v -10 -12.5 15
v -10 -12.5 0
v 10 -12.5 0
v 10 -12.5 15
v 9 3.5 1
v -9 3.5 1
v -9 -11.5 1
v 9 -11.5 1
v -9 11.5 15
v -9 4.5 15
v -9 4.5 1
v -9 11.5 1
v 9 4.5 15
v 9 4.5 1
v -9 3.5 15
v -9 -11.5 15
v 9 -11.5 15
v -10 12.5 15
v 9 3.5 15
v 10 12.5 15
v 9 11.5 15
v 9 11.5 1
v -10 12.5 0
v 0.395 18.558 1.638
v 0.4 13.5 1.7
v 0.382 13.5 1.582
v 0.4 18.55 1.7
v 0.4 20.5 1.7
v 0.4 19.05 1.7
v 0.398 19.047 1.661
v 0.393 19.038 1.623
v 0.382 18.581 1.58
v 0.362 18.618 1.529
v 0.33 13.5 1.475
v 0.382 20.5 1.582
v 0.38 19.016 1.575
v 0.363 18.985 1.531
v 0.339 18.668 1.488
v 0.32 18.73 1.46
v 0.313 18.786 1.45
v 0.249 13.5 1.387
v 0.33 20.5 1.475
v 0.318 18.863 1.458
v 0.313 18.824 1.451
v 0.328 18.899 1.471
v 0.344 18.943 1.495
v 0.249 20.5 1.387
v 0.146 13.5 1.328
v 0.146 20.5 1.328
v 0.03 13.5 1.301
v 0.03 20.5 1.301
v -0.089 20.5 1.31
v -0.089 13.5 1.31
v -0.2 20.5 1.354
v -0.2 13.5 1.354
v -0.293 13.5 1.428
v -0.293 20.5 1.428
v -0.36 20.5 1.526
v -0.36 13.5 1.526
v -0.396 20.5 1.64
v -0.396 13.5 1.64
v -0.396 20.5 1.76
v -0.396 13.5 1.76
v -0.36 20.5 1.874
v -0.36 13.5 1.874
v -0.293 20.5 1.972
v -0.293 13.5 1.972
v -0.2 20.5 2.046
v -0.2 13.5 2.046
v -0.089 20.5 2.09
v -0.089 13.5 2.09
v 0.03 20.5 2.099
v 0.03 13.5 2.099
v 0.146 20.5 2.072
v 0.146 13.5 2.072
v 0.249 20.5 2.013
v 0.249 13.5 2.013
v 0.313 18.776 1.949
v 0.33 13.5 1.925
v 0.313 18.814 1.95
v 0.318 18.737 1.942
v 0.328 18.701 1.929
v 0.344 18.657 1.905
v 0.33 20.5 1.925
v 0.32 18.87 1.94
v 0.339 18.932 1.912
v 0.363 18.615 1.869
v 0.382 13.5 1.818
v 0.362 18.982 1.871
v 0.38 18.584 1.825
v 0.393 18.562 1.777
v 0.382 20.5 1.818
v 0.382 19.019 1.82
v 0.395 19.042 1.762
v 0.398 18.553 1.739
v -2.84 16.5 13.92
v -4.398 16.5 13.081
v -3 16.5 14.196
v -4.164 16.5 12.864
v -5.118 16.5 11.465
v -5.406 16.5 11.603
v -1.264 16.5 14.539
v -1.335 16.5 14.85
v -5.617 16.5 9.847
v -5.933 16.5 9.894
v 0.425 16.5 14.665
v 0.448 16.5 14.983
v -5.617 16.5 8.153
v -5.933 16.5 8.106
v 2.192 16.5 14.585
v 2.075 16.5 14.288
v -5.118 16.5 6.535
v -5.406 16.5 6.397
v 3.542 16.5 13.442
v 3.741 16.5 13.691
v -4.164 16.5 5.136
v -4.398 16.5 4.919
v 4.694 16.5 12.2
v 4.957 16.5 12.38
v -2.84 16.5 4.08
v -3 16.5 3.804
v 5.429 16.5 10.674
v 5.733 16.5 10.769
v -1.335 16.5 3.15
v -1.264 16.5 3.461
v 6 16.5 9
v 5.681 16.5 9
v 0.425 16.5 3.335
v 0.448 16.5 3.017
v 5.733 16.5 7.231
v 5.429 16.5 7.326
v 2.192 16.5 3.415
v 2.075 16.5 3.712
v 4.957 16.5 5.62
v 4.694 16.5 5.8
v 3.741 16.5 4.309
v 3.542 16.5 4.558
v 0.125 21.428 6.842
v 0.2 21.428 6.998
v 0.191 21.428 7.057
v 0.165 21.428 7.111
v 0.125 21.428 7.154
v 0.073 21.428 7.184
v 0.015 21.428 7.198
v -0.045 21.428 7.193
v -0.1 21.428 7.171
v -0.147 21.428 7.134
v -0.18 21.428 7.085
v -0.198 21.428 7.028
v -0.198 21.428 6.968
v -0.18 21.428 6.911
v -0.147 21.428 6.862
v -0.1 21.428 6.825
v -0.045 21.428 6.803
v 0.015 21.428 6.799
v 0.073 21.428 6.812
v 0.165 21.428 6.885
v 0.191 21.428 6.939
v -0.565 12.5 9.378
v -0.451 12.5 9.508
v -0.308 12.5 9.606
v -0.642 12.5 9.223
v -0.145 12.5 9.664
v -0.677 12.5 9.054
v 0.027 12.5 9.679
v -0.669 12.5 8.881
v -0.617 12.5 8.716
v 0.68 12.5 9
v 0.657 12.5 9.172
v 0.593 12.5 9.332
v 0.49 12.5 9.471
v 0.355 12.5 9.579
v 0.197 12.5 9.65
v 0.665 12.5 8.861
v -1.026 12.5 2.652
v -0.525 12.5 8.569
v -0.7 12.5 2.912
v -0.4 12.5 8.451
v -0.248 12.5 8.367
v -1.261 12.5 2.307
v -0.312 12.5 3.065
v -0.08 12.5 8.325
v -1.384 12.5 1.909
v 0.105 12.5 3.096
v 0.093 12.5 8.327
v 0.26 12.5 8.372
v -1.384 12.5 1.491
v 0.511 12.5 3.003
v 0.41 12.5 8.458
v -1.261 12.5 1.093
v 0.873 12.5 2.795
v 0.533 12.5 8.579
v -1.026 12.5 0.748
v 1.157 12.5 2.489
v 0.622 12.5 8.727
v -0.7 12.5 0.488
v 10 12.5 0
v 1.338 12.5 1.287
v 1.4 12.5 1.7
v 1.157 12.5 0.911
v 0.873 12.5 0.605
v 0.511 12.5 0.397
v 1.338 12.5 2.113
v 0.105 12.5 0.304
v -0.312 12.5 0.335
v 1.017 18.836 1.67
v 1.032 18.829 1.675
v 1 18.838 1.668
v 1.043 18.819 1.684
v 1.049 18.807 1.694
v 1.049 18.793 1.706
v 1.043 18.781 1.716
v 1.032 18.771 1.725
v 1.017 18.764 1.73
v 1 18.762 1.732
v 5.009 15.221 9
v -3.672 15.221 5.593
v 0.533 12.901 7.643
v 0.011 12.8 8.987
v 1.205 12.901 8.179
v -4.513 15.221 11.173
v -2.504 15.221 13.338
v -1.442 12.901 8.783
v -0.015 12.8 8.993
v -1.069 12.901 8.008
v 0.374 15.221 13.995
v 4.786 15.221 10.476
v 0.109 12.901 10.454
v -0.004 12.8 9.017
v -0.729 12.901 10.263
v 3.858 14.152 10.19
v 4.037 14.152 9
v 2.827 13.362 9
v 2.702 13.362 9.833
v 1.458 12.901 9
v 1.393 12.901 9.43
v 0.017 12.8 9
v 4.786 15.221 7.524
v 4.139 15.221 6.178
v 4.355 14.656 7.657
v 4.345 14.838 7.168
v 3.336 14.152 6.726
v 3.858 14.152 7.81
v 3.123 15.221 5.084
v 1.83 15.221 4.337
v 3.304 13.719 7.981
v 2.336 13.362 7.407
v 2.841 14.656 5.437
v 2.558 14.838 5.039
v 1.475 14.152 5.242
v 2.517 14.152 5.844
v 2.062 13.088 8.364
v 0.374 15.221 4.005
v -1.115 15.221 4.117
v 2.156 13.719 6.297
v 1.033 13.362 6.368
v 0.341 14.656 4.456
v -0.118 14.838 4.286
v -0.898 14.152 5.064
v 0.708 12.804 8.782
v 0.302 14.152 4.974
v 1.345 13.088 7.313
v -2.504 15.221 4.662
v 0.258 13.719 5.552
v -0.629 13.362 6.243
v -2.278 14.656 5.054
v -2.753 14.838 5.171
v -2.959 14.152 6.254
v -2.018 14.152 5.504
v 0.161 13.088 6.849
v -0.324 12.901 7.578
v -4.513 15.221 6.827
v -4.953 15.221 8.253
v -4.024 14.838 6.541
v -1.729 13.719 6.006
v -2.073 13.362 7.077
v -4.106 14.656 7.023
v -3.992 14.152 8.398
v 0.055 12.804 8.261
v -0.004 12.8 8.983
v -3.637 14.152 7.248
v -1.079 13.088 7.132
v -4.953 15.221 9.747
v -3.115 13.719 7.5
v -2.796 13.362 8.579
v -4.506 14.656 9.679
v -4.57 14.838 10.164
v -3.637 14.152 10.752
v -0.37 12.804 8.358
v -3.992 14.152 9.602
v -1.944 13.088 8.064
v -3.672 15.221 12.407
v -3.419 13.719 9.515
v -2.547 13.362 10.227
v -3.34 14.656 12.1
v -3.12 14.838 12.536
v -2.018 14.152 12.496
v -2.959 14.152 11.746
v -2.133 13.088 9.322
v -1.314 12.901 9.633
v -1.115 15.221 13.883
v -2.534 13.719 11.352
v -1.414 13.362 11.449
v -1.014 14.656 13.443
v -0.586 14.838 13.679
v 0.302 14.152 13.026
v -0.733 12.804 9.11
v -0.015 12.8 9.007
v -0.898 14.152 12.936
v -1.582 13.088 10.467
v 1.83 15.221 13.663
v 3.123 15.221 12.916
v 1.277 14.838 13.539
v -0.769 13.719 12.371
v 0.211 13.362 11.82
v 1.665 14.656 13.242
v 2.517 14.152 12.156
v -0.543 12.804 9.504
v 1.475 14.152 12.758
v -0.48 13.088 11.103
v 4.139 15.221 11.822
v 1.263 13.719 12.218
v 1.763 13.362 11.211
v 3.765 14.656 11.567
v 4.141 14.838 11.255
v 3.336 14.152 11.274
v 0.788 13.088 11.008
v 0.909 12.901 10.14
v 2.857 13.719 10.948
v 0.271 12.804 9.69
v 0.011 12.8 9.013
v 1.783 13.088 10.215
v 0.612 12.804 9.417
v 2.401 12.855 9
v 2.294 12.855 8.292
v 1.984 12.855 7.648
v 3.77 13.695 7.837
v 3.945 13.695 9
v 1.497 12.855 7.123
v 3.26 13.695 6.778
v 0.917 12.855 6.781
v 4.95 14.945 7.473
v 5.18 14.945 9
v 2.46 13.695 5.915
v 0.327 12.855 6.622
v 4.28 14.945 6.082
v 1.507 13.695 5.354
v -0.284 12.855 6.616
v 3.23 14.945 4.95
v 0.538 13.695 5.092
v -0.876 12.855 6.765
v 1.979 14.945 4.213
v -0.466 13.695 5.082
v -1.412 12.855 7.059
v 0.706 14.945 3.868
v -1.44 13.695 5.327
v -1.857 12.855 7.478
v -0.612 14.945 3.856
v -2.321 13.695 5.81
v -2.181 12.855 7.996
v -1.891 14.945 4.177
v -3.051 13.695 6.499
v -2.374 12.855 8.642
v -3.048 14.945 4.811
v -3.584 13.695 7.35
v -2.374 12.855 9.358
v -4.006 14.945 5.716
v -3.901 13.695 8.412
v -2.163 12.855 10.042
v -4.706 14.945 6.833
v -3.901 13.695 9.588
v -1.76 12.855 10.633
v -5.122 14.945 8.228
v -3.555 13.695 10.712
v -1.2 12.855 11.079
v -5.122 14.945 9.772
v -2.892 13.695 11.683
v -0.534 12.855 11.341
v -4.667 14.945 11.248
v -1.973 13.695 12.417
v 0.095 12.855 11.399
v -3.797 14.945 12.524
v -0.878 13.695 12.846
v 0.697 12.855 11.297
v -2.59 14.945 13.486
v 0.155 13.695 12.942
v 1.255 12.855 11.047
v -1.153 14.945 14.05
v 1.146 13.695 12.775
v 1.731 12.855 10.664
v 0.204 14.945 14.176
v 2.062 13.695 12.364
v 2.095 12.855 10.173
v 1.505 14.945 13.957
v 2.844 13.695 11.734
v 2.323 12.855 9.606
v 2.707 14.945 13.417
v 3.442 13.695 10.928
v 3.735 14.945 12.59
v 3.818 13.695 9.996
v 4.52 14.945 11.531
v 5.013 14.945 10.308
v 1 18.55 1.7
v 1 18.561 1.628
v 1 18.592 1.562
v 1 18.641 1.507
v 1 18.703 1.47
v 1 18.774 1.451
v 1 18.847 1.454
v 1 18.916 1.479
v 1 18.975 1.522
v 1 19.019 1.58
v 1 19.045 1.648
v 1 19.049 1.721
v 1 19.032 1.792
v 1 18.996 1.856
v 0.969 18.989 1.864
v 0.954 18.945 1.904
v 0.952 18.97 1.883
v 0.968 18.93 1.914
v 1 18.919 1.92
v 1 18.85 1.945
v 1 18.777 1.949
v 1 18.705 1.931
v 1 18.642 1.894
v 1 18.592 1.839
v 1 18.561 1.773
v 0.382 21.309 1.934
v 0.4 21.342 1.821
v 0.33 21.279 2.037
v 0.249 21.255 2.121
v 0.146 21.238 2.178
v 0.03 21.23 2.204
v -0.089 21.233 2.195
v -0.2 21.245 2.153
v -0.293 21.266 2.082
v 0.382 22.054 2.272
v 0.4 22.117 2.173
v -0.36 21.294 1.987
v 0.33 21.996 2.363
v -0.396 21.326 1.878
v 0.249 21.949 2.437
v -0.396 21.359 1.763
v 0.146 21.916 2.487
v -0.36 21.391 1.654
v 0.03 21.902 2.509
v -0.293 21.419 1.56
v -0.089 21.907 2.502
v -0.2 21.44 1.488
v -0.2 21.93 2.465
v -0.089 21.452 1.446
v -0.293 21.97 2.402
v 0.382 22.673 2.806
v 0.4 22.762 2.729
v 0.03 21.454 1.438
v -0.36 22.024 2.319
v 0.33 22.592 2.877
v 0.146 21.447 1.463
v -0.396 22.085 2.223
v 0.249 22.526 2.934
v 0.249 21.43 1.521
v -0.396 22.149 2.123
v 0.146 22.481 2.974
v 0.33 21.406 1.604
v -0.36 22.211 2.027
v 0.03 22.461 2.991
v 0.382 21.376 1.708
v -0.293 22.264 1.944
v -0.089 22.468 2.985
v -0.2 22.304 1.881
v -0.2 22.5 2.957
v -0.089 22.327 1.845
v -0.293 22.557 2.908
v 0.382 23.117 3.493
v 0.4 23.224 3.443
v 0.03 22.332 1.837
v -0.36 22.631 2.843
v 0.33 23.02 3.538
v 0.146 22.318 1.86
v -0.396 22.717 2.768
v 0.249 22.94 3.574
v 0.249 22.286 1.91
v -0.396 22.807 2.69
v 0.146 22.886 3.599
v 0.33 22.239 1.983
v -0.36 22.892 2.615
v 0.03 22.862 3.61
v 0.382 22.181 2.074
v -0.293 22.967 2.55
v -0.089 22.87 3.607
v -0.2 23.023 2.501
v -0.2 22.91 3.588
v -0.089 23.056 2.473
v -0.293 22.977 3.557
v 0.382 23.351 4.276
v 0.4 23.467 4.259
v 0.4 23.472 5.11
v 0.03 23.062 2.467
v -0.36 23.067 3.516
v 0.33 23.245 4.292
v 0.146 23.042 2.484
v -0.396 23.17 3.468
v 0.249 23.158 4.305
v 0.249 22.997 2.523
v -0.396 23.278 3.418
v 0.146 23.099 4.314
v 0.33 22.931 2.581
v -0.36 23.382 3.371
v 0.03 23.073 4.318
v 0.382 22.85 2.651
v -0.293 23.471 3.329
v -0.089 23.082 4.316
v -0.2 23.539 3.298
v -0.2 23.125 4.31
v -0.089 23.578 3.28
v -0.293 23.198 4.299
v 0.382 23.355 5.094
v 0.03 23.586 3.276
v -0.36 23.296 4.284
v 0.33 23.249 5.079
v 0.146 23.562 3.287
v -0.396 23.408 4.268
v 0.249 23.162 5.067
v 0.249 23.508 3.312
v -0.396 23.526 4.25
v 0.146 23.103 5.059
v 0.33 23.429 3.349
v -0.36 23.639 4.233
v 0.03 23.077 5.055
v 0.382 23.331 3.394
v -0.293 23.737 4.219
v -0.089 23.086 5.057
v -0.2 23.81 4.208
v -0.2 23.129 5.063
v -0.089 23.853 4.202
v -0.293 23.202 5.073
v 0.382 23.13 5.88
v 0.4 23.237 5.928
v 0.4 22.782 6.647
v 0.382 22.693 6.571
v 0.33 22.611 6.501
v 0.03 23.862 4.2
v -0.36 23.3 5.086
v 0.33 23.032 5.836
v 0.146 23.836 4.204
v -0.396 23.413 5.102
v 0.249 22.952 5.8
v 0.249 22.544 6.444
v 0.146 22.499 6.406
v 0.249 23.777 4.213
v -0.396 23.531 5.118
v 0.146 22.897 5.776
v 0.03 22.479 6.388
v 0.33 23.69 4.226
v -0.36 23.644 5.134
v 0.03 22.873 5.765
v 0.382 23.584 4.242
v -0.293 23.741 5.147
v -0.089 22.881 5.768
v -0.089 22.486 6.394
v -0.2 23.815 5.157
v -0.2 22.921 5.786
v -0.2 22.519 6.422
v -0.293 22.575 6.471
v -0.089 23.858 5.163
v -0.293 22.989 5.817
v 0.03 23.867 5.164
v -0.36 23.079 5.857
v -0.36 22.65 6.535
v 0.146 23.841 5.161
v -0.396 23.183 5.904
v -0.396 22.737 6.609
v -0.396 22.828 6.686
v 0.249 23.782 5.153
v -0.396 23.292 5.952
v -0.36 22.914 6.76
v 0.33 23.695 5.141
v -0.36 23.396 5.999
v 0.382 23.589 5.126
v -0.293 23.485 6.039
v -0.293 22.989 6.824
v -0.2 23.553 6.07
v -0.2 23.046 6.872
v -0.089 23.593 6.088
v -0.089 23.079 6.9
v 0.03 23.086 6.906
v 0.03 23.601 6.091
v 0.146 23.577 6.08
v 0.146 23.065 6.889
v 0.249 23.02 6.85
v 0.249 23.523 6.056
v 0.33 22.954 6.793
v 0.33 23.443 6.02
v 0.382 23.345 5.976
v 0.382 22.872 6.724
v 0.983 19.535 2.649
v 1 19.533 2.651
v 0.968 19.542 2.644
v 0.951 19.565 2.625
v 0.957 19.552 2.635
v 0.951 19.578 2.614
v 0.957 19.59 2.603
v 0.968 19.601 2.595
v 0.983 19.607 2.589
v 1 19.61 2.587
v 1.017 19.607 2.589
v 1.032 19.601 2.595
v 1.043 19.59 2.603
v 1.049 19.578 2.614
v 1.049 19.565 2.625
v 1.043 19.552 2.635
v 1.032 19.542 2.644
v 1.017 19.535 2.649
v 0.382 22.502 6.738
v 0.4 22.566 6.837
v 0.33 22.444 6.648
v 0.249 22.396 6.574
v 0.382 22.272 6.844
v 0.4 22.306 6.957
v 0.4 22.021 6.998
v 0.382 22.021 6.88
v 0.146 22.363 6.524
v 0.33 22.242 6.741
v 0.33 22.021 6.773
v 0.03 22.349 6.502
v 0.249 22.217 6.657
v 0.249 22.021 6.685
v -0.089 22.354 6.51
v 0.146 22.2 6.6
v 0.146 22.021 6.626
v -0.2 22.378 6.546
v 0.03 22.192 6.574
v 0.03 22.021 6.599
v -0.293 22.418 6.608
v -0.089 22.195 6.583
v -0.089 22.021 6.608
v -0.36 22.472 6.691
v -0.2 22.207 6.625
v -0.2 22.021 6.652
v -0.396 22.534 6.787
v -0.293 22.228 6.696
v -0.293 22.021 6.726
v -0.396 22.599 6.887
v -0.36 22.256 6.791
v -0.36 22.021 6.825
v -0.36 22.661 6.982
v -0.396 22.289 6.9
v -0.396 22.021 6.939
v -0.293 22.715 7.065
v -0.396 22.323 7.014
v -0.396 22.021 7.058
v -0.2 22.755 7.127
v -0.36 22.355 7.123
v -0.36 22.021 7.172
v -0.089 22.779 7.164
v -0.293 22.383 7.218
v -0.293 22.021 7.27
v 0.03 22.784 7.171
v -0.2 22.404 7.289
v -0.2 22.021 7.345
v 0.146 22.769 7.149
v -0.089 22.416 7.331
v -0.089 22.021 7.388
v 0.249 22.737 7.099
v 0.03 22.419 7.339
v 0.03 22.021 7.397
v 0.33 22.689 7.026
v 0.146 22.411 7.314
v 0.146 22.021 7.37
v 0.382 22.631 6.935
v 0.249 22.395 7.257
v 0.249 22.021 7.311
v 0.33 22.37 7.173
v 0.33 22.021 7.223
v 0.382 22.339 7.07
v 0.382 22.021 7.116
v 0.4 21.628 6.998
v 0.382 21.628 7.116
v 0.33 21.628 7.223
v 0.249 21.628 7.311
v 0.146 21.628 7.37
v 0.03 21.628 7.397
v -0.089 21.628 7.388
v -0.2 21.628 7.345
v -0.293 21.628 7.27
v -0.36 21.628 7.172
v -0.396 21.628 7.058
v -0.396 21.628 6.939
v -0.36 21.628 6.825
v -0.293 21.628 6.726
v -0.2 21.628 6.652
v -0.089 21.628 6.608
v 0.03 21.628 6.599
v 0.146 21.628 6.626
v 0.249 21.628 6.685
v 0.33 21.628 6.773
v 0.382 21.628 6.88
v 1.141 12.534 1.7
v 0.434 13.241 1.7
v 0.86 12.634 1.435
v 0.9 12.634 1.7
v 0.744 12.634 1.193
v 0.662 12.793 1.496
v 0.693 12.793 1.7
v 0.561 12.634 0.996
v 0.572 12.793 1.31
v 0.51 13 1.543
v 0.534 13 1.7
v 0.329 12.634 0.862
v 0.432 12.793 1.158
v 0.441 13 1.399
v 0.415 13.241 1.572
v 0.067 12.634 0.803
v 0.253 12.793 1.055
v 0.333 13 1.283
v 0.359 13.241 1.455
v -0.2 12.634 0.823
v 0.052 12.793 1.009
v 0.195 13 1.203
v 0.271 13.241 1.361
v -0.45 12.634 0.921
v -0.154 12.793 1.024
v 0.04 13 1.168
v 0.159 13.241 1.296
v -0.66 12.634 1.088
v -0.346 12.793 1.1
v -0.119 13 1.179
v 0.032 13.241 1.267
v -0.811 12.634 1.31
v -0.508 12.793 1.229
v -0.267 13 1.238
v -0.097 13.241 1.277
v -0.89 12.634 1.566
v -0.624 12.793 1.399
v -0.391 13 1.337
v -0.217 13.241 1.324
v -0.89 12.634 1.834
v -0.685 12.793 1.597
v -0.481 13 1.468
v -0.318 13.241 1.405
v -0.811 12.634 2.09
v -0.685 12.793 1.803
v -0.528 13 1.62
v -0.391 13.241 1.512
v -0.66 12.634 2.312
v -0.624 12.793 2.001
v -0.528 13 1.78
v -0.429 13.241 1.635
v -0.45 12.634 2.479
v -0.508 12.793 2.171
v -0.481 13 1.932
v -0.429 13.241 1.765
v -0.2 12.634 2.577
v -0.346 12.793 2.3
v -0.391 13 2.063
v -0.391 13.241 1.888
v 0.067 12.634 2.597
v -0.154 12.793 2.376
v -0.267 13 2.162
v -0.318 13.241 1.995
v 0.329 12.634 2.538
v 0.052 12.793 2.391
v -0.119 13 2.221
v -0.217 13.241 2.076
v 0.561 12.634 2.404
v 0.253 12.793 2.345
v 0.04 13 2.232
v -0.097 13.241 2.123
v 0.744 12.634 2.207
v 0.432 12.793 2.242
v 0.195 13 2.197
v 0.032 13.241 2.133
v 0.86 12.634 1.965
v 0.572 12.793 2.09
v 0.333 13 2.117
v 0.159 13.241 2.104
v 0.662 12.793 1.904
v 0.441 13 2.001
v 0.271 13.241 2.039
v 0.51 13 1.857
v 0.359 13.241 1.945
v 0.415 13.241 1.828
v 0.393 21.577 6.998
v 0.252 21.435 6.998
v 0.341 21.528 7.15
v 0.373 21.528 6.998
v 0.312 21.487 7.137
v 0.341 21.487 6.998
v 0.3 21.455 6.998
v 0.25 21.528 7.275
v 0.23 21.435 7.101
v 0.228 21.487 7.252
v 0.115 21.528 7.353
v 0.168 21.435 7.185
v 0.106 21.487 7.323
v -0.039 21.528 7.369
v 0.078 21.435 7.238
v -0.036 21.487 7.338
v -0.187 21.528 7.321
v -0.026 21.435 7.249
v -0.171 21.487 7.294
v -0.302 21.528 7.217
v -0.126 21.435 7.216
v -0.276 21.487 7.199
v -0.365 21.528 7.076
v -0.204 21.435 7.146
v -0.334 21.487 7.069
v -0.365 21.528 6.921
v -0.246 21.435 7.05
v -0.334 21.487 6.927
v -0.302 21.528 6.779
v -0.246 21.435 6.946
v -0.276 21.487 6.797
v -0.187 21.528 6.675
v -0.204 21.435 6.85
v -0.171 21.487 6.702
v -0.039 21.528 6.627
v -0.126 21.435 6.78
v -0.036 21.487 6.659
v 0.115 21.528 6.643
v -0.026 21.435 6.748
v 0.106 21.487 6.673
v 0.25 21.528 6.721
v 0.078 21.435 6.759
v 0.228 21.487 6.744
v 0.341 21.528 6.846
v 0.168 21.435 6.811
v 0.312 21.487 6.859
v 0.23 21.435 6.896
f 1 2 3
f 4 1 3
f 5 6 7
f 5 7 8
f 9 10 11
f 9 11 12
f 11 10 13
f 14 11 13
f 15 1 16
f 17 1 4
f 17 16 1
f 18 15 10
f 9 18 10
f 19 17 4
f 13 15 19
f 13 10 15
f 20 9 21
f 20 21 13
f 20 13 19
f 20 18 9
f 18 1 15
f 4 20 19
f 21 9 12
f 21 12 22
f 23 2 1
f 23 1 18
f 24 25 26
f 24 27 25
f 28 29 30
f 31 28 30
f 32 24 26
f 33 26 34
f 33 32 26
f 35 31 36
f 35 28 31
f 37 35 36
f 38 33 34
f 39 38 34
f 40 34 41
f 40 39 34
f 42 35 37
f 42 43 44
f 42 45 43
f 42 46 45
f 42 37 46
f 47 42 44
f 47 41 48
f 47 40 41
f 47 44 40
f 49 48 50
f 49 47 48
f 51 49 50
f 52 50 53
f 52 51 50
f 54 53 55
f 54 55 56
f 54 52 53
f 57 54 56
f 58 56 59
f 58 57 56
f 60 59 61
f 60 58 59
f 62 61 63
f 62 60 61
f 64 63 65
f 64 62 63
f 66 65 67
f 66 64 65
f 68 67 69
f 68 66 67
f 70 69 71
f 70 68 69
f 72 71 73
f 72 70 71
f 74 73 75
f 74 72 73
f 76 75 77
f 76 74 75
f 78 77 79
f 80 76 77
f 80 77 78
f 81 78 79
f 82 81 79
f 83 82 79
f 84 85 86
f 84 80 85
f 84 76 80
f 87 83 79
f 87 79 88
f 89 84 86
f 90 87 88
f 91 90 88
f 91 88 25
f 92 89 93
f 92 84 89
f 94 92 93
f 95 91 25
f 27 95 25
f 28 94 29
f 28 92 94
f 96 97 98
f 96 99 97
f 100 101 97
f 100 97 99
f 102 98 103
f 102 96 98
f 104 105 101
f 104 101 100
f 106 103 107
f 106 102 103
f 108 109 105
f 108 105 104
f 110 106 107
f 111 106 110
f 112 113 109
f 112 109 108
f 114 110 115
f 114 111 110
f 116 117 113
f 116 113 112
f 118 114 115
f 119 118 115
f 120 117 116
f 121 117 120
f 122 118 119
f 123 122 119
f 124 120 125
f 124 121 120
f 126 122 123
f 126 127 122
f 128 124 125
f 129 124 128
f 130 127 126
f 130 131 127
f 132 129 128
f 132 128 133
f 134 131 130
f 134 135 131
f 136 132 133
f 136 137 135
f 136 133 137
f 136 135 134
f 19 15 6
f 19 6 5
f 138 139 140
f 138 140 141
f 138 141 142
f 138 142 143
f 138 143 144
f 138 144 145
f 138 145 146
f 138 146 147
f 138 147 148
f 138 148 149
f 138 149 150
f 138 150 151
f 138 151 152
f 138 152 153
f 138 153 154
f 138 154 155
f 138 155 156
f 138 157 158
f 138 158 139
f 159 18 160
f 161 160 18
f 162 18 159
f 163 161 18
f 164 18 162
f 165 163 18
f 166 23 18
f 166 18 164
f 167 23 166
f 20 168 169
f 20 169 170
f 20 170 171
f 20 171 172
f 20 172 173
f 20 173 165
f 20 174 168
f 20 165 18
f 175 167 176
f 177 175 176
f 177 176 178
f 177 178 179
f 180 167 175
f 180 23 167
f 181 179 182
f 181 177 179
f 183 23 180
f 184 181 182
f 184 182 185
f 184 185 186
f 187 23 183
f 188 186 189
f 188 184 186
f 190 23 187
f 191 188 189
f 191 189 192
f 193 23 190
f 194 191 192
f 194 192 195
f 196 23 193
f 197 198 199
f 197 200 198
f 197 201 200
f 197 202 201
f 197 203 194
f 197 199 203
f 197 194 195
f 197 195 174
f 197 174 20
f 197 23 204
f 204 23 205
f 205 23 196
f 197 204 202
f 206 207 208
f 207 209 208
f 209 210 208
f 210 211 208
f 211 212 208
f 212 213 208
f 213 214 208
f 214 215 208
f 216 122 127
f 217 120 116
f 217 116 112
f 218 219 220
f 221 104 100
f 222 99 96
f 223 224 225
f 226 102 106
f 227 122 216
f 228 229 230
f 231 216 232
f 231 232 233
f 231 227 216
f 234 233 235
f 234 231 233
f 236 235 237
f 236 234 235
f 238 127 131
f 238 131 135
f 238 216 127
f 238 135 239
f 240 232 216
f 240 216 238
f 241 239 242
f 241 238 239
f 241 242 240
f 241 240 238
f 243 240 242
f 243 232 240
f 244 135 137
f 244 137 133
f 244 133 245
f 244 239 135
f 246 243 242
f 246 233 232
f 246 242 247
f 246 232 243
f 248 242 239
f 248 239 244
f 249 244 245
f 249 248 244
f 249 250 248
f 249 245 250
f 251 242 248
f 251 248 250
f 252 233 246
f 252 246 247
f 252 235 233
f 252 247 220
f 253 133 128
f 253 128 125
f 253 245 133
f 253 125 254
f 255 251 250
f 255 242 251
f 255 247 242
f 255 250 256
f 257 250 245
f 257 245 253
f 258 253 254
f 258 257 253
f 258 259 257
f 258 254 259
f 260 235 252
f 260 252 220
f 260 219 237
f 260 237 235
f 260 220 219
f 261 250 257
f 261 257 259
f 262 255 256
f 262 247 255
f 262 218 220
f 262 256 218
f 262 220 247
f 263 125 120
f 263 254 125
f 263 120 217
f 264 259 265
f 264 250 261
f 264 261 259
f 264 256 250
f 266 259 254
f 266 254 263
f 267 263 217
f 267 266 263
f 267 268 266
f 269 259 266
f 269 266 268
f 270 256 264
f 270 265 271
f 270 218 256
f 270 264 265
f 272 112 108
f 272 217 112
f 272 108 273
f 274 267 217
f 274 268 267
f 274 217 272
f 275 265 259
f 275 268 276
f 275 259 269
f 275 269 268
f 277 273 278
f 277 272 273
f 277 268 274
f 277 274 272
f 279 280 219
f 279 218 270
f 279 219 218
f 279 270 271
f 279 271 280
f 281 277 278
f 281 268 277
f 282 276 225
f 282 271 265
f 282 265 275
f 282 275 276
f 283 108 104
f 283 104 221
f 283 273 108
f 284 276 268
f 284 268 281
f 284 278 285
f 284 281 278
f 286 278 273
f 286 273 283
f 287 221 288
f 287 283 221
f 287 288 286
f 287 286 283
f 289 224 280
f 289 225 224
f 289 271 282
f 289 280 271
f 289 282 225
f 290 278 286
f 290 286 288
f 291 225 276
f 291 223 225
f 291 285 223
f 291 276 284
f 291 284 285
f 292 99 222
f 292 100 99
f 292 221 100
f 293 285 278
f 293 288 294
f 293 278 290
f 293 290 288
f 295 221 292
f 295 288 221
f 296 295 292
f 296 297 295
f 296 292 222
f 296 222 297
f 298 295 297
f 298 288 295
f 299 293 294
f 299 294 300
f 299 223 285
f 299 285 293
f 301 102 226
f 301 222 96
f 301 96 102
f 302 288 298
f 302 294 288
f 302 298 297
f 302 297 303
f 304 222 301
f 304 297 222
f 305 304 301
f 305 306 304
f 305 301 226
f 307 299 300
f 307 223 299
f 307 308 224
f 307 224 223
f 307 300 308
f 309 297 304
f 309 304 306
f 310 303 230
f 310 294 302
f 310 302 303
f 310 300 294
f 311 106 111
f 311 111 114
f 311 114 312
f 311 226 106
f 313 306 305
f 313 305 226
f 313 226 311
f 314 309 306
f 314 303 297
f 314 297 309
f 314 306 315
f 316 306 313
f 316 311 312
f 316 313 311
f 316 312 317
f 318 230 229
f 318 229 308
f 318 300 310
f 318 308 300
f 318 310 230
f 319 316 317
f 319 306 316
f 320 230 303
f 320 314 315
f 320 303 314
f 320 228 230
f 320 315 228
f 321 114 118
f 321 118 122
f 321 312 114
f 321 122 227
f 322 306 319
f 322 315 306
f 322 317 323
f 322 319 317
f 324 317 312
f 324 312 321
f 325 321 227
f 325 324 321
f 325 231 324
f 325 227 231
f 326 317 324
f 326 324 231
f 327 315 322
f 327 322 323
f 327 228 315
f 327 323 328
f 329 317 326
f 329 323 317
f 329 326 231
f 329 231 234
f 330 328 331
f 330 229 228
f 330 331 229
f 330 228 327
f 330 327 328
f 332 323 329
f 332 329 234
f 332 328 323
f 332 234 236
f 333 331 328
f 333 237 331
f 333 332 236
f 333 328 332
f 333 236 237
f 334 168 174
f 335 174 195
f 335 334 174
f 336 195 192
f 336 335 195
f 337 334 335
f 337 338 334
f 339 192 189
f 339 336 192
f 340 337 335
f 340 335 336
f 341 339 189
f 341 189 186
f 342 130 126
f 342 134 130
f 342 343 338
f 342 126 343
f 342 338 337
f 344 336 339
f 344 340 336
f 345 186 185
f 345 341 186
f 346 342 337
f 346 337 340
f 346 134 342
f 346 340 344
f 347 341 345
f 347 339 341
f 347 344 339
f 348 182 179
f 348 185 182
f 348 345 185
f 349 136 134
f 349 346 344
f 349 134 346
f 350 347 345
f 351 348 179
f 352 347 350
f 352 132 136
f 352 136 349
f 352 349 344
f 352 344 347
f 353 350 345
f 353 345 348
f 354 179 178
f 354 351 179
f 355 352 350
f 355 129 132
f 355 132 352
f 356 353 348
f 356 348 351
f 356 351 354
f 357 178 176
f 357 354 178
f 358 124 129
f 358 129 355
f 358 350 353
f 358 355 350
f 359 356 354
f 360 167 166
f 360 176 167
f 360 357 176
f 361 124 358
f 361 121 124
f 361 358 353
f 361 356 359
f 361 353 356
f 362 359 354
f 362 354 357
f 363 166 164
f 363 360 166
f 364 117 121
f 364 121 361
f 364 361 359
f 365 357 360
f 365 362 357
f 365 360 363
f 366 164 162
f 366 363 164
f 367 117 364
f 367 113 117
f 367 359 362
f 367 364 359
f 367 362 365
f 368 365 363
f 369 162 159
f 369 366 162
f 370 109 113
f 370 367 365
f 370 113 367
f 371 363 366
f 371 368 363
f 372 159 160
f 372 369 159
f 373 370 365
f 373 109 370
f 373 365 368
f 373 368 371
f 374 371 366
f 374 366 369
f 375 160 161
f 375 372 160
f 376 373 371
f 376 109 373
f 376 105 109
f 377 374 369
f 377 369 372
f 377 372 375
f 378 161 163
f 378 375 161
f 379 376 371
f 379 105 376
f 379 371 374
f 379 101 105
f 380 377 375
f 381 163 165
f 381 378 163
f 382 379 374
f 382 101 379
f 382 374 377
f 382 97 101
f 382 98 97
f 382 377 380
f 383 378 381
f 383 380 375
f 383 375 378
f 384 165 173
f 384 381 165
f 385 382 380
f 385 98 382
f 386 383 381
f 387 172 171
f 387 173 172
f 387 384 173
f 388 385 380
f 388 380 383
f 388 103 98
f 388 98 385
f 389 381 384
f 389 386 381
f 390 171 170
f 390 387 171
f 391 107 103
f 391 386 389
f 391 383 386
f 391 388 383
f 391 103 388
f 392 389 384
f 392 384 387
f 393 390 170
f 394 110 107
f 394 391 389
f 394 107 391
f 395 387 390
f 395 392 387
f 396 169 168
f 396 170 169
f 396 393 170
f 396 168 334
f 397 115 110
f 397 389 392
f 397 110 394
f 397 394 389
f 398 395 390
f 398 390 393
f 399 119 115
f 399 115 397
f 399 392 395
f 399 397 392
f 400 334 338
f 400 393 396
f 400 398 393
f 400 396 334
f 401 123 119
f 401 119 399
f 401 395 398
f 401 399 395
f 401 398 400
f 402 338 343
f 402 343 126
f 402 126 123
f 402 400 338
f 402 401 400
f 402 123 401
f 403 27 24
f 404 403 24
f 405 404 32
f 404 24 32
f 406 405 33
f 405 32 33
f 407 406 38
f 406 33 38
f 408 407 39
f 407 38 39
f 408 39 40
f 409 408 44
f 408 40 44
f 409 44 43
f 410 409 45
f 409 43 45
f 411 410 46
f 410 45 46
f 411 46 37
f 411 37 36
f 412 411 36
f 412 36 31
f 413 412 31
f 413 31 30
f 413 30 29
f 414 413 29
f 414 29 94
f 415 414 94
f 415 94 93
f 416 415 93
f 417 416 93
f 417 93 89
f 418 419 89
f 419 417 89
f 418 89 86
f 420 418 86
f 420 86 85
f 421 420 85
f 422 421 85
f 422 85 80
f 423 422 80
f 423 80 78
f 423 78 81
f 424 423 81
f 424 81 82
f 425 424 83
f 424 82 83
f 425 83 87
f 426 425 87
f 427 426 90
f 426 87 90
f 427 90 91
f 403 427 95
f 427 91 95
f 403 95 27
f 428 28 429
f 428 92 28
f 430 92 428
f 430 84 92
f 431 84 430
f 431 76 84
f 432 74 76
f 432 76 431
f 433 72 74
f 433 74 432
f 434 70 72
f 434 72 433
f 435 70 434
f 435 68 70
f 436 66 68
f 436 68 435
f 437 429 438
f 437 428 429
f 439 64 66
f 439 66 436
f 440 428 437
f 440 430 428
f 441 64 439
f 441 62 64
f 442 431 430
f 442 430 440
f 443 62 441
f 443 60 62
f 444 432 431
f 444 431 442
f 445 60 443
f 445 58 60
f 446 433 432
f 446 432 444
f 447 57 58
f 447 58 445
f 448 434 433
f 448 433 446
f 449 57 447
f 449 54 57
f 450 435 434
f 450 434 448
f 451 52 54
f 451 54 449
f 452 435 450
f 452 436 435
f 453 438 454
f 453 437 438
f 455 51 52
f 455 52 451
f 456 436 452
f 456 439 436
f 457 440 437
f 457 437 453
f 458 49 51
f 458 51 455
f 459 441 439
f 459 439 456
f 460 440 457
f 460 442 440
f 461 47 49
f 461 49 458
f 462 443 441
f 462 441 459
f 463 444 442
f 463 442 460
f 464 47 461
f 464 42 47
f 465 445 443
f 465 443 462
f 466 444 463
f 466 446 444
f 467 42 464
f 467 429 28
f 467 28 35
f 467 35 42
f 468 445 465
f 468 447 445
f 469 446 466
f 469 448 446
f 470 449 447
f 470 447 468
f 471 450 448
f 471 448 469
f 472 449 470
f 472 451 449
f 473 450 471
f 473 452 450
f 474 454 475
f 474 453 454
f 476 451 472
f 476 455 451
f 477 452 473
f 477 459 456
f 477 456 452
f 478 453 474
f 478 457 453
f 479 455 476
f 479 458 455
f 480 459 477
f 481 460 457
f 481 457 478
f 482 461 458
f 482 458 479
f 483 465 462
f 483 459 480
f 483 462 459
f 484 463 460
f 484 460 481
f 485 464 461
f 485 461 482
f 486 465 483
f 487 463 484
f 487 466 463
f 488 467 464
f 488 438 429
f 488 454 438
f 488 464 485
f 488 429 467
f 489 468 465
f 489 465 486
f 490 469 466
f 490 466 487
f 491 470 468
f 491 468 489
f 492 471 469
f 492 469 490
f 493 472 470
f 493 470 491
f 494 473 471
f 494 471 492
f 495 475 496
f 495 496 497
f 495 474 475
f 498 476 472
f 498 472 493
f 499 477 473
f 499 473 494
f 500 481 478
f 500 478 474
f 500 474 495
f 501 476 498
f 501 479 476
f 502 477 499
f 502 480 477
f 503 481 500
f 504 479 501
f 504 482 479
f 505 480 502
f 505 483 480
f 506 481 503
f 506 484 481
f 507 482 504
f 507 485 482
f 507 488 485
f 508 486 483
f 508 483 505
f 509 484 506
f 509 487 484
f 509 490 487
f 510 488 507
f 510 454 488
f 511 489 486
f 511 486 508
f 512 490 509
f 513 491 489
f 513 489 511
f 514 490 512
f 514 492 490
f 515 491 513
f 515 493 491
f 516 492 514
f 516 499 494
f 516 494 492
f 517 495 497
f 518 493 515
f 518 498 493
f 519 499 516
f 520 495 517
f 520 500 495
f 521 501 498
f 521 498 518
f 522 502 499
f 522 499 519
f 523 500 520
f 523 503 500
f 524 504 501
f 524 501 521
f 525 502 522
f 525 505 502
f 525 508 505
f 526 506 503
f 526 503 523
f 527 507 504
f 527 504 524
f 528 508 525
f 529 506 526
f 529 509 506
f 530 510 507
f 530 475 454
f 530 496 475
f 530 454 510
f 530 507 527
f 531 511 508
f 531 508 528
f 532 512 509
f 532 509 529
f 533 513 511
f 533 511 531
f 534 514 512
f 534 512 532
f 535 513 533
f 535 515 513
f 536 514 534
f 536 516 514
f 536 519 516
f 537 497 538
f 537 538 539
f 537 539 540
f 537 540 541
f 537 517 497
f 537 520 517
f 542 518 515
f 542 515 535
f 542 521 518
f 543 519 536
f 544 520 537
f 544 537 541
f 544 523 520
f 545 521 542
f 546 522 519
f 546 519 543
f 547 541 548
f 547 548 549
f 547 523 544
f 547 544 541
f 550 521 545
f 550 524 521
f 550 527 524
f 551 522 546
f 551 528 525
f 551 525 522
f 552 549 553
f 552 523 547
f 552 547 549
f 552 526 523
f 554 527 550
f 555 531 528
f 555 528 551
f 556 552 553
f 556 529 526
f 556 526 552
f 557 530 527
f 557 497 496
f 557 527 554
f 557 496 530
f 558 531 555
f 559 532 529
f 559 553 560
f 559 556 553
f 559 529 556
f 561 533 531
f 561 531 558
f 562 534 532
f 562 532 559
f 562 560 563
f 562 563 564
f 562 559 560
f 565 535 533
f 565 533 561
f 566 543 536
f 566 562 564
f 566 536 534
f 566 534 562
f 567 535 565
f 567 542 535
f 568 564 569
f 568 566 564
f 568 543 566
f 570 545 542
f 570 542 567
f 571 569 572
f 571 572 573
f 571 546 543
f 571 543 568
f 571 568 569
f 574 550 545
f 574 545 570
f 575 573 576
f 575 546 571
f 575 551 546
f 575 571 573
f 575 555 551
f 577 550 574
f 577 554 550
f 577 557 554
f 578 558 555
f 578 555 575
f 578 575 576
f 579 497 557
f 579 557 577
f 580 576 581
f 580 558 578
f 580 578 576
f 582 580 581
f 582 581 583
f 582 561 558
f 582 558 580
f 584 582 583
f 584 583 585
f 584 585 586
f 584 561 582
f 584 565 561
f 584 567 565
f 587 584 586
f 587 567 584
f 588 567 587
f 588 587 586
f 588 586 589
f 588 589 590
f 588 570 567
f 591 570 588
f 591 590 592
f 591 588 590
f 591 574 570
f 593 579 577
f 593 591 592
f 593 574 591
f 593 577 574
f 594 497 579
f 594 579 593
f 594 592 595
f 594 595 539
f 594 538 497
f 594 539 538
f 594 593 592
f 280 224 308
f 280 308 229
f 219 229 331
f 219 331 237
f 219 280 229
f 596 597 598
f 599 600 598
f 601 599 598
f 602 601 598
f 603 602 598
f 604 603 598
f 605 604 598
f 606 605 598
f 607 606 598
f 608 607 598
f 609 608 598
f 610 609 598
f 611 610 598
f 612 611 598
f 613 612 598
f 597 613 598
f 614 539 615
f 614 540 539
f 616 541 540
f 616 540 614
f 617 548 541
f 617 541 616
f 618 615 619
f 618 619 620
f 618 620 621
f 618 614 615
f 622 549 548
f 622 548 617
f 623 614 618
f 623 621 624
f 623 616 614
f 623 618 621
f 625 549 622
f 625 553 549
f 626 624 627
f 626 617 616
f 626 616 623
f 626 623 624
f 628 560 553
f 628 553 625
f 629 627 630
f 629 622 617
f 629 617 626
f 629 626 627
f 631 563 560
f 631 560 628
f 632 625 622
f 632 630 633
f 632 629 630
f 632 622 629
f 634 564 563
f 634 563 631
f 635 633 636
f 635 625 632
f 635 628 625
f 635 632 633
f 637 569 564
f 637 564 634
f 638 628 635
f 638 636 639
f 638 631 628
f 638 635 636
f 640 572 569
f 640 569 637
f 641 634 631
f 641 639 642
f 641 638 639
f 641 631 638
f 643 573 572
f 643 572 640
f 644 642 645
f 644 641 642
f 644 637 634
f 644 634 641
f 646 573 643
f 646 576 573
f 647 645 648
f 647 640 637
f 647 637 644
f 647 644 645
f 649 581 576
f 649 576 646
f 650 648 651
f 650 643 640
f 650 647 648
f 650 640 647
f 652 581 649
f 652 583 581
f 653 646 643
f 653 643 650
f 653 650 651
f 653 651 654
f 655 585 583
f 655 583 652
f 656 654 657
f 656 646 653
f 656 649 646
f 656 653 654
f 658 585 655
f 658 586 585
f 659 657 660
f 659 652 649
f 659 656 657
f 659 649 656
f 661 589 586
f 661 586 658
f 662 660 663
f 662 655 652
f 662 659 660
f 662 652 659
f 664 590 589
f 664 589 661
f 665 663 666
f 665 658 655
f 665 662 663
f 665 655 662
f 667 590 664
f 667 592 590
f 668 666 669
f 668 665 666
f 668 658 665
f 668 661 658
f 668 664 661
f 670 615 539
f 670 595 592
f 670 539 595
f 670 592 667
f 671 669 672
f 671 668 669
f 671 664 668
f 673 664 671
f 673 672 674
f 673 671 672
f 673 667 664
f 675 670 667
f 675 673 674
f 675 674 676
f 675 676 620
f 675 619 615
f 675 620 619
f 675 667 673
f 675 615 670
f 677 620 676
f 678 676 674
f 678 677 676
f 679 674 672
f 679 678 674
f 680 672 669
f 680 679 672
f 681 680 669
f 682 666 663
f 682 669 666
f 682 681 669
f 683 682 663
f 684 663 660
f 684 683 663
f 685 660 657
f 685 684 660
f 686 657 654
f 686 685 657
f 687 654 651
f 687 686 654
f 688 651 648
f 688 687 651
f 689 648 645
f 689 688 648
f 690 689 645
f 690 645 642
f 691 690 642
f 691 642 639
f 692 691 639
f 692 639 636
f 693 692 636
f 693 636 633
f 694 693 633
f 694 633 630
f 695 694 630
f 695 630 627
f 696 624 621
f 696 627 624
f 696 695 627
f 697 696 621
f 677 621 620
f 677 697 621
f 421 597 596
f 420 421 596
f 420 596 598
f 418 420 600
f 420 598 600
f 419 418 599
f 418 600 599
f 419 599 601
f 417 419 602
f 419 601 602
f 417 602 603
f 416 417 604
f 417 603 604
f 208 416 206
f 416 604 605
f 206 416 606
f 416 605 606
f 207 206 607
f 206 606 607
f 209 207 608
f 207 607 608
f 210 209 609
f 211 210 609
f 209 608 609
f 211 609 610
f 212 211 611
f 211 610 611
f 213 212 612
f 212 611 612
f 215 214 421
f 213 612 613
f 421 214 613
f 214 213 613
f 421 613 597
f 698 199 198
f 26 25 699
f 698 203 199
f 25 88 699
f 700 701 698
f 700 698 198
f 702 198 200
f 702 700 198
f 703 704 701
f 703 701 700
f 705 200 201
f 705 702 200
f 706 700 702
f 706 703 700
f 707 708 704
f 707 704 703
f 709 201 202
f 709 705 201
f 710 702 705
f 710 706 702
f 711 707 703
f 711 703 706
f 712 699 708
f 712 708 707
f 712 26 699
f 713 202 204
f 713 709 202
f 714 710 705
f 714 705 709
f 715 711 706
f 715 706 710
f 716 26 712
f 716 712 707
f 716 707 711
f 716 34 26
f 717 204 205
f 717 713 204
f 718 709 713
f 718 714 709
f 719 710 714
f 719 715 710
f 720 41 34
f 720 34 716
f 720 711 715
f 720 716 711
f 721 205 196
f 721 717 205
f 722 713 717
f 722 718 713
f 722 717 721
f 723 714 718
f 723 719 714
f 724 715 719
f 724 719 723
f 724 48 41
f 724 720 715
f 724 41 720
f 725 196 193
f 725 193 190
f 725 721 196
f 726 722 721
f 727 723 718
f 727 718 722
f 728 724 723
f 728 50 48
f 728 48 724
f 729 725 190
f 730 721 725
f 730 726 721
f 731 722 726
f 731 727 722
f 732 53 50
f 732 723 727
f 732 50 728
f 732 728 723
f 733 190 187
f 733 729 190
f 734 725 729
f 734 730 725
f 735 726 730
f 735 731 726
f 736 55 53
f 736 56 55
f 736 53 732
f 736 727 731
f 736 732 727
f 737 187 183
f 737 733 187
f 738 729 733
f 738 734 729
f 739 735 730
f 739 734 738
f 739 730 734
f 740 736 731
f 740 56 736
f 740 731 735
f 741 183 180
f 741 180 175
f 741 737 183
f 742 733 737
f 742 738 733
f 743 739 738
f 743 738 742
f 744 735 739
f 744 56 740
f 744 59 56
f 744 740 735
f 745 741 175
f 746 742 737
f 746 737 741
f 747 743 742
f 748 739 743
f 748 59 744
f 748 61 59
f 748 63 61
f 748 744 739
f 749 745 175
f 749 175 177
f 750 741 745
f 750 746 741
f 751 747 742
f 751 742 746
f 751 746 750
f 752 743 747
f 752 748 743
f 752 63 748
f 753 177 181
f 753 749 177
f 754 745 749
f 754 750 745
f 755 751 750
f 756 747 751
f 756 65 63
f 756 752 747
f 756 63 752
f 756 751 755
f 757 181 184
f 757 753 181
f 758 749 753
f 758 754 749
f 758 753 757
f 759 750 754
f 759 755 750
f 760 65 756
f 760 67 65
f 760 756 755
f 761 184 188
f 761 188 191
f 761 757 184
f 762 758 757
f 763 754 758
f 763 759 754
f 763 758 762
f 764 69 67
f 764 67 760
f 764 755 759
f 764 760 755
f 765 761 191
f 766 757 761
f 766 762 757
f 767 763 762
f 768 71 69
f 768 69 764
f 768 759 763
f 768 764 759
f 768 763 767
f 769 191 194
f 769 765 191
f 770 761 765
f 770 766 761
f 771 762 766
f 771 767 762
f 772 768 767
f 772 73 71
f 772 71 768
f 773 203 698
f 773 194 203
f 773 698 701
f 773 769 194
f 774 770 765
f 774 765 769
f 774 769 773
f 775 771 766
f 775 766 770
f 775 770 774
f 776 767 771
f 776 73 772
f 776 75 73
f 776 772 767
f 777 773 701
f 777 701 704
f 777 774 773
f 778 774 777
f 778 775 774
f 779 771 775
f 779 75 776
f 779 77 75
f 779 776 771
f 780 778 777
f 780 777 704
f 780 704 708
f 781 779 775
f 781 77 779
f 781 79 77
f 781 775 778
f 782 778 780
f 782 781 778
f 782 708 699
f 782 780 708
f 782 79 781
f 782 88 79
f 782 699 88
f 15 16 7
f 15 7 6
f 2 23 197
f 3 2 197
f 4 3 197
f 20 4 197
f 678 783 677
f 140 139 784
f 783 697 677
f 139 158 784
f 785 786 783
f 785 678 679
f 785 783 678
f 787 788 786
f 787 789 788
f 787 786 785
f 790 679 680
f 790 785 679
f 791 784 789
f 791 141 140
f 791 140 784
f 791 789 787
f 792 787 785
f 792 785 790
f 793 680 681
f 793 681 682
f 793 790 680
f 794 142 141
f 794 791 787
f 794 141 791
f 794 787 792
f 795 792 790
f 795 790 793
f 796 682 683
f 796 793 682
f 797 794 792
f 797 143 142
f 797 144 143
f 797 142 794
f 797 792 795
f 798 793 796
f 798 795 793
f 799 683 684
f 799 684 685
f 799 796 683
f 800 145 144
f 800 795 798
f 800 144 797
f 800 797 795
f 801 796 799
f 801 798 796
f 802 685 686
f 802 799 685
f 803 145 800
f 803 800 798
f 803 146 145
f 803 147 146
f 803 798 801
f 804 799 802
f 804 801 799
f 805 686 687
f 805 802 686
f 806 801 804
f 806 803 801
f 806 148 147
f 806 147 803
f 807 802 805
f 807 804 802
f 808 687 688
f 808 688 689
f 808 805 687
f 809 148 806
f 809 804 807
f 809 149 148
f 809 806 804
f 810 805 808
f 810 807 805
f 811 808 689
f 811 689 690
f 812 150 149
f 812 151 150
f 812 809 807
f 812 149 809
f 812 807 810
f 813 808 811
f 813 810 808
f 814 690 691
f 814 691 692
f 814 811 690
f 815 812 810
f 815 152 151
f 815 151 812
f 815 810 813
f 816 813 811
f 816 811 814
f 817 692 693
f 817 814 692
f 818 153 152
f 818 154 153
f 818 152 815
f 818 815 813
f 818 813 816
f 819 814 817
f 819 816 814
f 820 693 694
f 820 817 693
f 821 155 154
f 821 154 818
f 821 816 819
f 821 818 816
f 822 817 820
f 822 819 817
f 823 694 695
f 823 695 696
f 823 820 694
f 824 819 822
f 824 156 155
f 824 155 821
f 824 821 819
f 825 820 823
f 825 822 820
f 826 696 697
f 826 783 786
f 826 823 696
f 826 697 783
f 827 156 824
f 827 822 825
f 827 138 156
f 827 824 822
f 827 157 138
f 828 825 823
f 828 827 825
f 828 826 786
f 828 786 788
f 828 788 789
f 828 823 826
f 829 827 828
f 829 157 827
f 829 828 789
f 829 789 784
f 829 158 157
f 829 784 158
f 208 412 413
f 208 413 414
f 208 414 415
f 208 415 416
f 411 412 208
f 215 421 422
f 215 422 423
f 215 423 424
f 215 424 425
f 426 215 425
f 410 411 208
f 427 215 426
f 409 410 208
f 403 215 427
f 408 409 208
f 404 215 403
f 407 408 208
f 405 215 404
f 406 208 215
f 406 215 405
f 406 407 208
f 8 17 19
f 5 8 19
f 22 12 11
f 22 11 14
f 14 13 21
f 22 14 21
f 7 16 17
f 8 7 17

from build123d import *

# Parameters (mm, degrees)
SKETCH_1_W          = 20
SKETCH_1_H          = 25
EXTRUDE_1_DEPTH     = 15
SKETCH_2_W          = 18
SKETCH_2_H          = 7
SKETCH_2_H_2        = 15
CUT_EXTRUDE_1_DEPTH = 14
SKETCH_5_R          = 0.4
FILLET_1_R          = 1
SKETCH_7_R          = 0.25
EXTRUDE_3_DEPTH     = 1
FILLET_2_R          = 0.2


with BuildPart() as part:
    # 草圖1 → 填料-伸長1 (new body)
    with BuildSketch(Plane.XY):
        Rectangle(SKETCH_1_W, SKETCH_1_H)
    extrude(amount=EXTRUDE_1_DEPTH)

    # 草圖2 → 除料-伸長1 (cut)
    with BuildSketch(Plane.XY.offset(15)):
        with Locations((0, 8)):
            Rectangle(SKETCH_2_W, SKETCH_2_H)
        with Locations((0, -4)):
            Rectangle(SKETCH_2_W, SKETCH_2_H_2)
    extrude(amount=-CUT_EXTRUDE_1_DEPTH, mode=Mode.SUBTRACT)

    # 草圖4 → 旋轉4 (revolve)
    with BuildSketch(Plane(origin=(0, 0, 0), x_dir=(0, 0, -1), z_dir=(1, 0, 0)), mode=Mode.PRIVATE) as revolve_4_sk:
        with BuildLine():
            Line((-15, 16.5), (-14.680951103, 16.5))
            ThreePointArc((-14.680951103, 16.5), (-12.457373104, 13.7185354), (-9.016987566, 12.799518652))
            Line((-9.016987566, 12.799518652), (-9, 12.799518652))
            Line((-9, 12.799518652), (-9, 12.5))
            ThreePointArc((-9, 12.5), (-12.66795249, 13.498071265), (-15, 16.5))
        make_face()
    revolve(revolve_4_sk.sketch.rotate(Axis((0, -12.5, 9), (0, 1, 0)), 90), axis=Axis((0, -12.5, 9), (0, 1, 0)))

    # 掃出1: sweep along a path in 草圖6
    with BuildLine(Plane(origin=(0, 0, 0), x_dir=(0, 0, -1), z_dir=(1, 0, 0))) as sweep_1_path:
        Line((-1.7, 12.5), (-1.7, 20.5))
        ThreePointArc((-1.7, 20.5), (-3.443337751, 23.224114533), (-6.647199994, 22.782194598))
        ThreePointArc((-6.647199994, 22.782194598), (-6.906171507, 22.440350482), (-6.998133329, 22.021463065))
        Line((-6.998133329, 22.021463065), (-6.998133329, 21.428362829))
    # 草圖5 → 掃出1 (sweep)
    with BuildSketch(Plane(origin=(0, 12.5, 0), x_dir=(1, 0, 0), z_dir=(0, 1, 0))):
        with Locations((0, -1.7)):
            Circle(SKETCH_5_R)
    sweep(path=sweep_1_path.line)

    # 圓角1
    fillet_1_edges = [part.edges().sort_by_distance(p)[0] for p in [
        (-0.4, 12.5, 1.7),
    ]]
    fillet(fillet_1_edges, radius=FILLET_1_R)

    # 草圖7 → 填料-伸長3 (add)
    with BuildSketch(Plane(origin=(0, 0, 0), x_dir=(0, 0, -1), z_dir=(1, 0, 0))):
        with Locations(Location((-1.7, 18.8, 0), (0, 0, 270))):
            Circle(SKETCH_7_R)
    extrude(amount=EXTRUDE_3_DEPTH)

    # 草圖8 → 旋轉5 (revolve)
    with BuildSketch(Plane(origin=(1, 0, 0), x_dir=(0, 0, -1), z_dir=(1, 0, 0))):
        Polygon((-2.619253332, 19.571345132), (-1.7, 18.8), (-1.73213938, 18.761697778), (-2.651392712, 19.533042909), align=None)
    revolve(axis=Axis((1, 18.8, 1.7), (0, -0.6427876096865434, -0.7660444431189747)))

    # 圓角2
    fillet_2_edges = [part.edges().sort_by_distance(p)[0] for p in [
        (-0.4, 21.428362829, 6.998133329),
    ]]
    fillet(fillet_2_edges, radius=FILLET_2_R)


solid = part.part
